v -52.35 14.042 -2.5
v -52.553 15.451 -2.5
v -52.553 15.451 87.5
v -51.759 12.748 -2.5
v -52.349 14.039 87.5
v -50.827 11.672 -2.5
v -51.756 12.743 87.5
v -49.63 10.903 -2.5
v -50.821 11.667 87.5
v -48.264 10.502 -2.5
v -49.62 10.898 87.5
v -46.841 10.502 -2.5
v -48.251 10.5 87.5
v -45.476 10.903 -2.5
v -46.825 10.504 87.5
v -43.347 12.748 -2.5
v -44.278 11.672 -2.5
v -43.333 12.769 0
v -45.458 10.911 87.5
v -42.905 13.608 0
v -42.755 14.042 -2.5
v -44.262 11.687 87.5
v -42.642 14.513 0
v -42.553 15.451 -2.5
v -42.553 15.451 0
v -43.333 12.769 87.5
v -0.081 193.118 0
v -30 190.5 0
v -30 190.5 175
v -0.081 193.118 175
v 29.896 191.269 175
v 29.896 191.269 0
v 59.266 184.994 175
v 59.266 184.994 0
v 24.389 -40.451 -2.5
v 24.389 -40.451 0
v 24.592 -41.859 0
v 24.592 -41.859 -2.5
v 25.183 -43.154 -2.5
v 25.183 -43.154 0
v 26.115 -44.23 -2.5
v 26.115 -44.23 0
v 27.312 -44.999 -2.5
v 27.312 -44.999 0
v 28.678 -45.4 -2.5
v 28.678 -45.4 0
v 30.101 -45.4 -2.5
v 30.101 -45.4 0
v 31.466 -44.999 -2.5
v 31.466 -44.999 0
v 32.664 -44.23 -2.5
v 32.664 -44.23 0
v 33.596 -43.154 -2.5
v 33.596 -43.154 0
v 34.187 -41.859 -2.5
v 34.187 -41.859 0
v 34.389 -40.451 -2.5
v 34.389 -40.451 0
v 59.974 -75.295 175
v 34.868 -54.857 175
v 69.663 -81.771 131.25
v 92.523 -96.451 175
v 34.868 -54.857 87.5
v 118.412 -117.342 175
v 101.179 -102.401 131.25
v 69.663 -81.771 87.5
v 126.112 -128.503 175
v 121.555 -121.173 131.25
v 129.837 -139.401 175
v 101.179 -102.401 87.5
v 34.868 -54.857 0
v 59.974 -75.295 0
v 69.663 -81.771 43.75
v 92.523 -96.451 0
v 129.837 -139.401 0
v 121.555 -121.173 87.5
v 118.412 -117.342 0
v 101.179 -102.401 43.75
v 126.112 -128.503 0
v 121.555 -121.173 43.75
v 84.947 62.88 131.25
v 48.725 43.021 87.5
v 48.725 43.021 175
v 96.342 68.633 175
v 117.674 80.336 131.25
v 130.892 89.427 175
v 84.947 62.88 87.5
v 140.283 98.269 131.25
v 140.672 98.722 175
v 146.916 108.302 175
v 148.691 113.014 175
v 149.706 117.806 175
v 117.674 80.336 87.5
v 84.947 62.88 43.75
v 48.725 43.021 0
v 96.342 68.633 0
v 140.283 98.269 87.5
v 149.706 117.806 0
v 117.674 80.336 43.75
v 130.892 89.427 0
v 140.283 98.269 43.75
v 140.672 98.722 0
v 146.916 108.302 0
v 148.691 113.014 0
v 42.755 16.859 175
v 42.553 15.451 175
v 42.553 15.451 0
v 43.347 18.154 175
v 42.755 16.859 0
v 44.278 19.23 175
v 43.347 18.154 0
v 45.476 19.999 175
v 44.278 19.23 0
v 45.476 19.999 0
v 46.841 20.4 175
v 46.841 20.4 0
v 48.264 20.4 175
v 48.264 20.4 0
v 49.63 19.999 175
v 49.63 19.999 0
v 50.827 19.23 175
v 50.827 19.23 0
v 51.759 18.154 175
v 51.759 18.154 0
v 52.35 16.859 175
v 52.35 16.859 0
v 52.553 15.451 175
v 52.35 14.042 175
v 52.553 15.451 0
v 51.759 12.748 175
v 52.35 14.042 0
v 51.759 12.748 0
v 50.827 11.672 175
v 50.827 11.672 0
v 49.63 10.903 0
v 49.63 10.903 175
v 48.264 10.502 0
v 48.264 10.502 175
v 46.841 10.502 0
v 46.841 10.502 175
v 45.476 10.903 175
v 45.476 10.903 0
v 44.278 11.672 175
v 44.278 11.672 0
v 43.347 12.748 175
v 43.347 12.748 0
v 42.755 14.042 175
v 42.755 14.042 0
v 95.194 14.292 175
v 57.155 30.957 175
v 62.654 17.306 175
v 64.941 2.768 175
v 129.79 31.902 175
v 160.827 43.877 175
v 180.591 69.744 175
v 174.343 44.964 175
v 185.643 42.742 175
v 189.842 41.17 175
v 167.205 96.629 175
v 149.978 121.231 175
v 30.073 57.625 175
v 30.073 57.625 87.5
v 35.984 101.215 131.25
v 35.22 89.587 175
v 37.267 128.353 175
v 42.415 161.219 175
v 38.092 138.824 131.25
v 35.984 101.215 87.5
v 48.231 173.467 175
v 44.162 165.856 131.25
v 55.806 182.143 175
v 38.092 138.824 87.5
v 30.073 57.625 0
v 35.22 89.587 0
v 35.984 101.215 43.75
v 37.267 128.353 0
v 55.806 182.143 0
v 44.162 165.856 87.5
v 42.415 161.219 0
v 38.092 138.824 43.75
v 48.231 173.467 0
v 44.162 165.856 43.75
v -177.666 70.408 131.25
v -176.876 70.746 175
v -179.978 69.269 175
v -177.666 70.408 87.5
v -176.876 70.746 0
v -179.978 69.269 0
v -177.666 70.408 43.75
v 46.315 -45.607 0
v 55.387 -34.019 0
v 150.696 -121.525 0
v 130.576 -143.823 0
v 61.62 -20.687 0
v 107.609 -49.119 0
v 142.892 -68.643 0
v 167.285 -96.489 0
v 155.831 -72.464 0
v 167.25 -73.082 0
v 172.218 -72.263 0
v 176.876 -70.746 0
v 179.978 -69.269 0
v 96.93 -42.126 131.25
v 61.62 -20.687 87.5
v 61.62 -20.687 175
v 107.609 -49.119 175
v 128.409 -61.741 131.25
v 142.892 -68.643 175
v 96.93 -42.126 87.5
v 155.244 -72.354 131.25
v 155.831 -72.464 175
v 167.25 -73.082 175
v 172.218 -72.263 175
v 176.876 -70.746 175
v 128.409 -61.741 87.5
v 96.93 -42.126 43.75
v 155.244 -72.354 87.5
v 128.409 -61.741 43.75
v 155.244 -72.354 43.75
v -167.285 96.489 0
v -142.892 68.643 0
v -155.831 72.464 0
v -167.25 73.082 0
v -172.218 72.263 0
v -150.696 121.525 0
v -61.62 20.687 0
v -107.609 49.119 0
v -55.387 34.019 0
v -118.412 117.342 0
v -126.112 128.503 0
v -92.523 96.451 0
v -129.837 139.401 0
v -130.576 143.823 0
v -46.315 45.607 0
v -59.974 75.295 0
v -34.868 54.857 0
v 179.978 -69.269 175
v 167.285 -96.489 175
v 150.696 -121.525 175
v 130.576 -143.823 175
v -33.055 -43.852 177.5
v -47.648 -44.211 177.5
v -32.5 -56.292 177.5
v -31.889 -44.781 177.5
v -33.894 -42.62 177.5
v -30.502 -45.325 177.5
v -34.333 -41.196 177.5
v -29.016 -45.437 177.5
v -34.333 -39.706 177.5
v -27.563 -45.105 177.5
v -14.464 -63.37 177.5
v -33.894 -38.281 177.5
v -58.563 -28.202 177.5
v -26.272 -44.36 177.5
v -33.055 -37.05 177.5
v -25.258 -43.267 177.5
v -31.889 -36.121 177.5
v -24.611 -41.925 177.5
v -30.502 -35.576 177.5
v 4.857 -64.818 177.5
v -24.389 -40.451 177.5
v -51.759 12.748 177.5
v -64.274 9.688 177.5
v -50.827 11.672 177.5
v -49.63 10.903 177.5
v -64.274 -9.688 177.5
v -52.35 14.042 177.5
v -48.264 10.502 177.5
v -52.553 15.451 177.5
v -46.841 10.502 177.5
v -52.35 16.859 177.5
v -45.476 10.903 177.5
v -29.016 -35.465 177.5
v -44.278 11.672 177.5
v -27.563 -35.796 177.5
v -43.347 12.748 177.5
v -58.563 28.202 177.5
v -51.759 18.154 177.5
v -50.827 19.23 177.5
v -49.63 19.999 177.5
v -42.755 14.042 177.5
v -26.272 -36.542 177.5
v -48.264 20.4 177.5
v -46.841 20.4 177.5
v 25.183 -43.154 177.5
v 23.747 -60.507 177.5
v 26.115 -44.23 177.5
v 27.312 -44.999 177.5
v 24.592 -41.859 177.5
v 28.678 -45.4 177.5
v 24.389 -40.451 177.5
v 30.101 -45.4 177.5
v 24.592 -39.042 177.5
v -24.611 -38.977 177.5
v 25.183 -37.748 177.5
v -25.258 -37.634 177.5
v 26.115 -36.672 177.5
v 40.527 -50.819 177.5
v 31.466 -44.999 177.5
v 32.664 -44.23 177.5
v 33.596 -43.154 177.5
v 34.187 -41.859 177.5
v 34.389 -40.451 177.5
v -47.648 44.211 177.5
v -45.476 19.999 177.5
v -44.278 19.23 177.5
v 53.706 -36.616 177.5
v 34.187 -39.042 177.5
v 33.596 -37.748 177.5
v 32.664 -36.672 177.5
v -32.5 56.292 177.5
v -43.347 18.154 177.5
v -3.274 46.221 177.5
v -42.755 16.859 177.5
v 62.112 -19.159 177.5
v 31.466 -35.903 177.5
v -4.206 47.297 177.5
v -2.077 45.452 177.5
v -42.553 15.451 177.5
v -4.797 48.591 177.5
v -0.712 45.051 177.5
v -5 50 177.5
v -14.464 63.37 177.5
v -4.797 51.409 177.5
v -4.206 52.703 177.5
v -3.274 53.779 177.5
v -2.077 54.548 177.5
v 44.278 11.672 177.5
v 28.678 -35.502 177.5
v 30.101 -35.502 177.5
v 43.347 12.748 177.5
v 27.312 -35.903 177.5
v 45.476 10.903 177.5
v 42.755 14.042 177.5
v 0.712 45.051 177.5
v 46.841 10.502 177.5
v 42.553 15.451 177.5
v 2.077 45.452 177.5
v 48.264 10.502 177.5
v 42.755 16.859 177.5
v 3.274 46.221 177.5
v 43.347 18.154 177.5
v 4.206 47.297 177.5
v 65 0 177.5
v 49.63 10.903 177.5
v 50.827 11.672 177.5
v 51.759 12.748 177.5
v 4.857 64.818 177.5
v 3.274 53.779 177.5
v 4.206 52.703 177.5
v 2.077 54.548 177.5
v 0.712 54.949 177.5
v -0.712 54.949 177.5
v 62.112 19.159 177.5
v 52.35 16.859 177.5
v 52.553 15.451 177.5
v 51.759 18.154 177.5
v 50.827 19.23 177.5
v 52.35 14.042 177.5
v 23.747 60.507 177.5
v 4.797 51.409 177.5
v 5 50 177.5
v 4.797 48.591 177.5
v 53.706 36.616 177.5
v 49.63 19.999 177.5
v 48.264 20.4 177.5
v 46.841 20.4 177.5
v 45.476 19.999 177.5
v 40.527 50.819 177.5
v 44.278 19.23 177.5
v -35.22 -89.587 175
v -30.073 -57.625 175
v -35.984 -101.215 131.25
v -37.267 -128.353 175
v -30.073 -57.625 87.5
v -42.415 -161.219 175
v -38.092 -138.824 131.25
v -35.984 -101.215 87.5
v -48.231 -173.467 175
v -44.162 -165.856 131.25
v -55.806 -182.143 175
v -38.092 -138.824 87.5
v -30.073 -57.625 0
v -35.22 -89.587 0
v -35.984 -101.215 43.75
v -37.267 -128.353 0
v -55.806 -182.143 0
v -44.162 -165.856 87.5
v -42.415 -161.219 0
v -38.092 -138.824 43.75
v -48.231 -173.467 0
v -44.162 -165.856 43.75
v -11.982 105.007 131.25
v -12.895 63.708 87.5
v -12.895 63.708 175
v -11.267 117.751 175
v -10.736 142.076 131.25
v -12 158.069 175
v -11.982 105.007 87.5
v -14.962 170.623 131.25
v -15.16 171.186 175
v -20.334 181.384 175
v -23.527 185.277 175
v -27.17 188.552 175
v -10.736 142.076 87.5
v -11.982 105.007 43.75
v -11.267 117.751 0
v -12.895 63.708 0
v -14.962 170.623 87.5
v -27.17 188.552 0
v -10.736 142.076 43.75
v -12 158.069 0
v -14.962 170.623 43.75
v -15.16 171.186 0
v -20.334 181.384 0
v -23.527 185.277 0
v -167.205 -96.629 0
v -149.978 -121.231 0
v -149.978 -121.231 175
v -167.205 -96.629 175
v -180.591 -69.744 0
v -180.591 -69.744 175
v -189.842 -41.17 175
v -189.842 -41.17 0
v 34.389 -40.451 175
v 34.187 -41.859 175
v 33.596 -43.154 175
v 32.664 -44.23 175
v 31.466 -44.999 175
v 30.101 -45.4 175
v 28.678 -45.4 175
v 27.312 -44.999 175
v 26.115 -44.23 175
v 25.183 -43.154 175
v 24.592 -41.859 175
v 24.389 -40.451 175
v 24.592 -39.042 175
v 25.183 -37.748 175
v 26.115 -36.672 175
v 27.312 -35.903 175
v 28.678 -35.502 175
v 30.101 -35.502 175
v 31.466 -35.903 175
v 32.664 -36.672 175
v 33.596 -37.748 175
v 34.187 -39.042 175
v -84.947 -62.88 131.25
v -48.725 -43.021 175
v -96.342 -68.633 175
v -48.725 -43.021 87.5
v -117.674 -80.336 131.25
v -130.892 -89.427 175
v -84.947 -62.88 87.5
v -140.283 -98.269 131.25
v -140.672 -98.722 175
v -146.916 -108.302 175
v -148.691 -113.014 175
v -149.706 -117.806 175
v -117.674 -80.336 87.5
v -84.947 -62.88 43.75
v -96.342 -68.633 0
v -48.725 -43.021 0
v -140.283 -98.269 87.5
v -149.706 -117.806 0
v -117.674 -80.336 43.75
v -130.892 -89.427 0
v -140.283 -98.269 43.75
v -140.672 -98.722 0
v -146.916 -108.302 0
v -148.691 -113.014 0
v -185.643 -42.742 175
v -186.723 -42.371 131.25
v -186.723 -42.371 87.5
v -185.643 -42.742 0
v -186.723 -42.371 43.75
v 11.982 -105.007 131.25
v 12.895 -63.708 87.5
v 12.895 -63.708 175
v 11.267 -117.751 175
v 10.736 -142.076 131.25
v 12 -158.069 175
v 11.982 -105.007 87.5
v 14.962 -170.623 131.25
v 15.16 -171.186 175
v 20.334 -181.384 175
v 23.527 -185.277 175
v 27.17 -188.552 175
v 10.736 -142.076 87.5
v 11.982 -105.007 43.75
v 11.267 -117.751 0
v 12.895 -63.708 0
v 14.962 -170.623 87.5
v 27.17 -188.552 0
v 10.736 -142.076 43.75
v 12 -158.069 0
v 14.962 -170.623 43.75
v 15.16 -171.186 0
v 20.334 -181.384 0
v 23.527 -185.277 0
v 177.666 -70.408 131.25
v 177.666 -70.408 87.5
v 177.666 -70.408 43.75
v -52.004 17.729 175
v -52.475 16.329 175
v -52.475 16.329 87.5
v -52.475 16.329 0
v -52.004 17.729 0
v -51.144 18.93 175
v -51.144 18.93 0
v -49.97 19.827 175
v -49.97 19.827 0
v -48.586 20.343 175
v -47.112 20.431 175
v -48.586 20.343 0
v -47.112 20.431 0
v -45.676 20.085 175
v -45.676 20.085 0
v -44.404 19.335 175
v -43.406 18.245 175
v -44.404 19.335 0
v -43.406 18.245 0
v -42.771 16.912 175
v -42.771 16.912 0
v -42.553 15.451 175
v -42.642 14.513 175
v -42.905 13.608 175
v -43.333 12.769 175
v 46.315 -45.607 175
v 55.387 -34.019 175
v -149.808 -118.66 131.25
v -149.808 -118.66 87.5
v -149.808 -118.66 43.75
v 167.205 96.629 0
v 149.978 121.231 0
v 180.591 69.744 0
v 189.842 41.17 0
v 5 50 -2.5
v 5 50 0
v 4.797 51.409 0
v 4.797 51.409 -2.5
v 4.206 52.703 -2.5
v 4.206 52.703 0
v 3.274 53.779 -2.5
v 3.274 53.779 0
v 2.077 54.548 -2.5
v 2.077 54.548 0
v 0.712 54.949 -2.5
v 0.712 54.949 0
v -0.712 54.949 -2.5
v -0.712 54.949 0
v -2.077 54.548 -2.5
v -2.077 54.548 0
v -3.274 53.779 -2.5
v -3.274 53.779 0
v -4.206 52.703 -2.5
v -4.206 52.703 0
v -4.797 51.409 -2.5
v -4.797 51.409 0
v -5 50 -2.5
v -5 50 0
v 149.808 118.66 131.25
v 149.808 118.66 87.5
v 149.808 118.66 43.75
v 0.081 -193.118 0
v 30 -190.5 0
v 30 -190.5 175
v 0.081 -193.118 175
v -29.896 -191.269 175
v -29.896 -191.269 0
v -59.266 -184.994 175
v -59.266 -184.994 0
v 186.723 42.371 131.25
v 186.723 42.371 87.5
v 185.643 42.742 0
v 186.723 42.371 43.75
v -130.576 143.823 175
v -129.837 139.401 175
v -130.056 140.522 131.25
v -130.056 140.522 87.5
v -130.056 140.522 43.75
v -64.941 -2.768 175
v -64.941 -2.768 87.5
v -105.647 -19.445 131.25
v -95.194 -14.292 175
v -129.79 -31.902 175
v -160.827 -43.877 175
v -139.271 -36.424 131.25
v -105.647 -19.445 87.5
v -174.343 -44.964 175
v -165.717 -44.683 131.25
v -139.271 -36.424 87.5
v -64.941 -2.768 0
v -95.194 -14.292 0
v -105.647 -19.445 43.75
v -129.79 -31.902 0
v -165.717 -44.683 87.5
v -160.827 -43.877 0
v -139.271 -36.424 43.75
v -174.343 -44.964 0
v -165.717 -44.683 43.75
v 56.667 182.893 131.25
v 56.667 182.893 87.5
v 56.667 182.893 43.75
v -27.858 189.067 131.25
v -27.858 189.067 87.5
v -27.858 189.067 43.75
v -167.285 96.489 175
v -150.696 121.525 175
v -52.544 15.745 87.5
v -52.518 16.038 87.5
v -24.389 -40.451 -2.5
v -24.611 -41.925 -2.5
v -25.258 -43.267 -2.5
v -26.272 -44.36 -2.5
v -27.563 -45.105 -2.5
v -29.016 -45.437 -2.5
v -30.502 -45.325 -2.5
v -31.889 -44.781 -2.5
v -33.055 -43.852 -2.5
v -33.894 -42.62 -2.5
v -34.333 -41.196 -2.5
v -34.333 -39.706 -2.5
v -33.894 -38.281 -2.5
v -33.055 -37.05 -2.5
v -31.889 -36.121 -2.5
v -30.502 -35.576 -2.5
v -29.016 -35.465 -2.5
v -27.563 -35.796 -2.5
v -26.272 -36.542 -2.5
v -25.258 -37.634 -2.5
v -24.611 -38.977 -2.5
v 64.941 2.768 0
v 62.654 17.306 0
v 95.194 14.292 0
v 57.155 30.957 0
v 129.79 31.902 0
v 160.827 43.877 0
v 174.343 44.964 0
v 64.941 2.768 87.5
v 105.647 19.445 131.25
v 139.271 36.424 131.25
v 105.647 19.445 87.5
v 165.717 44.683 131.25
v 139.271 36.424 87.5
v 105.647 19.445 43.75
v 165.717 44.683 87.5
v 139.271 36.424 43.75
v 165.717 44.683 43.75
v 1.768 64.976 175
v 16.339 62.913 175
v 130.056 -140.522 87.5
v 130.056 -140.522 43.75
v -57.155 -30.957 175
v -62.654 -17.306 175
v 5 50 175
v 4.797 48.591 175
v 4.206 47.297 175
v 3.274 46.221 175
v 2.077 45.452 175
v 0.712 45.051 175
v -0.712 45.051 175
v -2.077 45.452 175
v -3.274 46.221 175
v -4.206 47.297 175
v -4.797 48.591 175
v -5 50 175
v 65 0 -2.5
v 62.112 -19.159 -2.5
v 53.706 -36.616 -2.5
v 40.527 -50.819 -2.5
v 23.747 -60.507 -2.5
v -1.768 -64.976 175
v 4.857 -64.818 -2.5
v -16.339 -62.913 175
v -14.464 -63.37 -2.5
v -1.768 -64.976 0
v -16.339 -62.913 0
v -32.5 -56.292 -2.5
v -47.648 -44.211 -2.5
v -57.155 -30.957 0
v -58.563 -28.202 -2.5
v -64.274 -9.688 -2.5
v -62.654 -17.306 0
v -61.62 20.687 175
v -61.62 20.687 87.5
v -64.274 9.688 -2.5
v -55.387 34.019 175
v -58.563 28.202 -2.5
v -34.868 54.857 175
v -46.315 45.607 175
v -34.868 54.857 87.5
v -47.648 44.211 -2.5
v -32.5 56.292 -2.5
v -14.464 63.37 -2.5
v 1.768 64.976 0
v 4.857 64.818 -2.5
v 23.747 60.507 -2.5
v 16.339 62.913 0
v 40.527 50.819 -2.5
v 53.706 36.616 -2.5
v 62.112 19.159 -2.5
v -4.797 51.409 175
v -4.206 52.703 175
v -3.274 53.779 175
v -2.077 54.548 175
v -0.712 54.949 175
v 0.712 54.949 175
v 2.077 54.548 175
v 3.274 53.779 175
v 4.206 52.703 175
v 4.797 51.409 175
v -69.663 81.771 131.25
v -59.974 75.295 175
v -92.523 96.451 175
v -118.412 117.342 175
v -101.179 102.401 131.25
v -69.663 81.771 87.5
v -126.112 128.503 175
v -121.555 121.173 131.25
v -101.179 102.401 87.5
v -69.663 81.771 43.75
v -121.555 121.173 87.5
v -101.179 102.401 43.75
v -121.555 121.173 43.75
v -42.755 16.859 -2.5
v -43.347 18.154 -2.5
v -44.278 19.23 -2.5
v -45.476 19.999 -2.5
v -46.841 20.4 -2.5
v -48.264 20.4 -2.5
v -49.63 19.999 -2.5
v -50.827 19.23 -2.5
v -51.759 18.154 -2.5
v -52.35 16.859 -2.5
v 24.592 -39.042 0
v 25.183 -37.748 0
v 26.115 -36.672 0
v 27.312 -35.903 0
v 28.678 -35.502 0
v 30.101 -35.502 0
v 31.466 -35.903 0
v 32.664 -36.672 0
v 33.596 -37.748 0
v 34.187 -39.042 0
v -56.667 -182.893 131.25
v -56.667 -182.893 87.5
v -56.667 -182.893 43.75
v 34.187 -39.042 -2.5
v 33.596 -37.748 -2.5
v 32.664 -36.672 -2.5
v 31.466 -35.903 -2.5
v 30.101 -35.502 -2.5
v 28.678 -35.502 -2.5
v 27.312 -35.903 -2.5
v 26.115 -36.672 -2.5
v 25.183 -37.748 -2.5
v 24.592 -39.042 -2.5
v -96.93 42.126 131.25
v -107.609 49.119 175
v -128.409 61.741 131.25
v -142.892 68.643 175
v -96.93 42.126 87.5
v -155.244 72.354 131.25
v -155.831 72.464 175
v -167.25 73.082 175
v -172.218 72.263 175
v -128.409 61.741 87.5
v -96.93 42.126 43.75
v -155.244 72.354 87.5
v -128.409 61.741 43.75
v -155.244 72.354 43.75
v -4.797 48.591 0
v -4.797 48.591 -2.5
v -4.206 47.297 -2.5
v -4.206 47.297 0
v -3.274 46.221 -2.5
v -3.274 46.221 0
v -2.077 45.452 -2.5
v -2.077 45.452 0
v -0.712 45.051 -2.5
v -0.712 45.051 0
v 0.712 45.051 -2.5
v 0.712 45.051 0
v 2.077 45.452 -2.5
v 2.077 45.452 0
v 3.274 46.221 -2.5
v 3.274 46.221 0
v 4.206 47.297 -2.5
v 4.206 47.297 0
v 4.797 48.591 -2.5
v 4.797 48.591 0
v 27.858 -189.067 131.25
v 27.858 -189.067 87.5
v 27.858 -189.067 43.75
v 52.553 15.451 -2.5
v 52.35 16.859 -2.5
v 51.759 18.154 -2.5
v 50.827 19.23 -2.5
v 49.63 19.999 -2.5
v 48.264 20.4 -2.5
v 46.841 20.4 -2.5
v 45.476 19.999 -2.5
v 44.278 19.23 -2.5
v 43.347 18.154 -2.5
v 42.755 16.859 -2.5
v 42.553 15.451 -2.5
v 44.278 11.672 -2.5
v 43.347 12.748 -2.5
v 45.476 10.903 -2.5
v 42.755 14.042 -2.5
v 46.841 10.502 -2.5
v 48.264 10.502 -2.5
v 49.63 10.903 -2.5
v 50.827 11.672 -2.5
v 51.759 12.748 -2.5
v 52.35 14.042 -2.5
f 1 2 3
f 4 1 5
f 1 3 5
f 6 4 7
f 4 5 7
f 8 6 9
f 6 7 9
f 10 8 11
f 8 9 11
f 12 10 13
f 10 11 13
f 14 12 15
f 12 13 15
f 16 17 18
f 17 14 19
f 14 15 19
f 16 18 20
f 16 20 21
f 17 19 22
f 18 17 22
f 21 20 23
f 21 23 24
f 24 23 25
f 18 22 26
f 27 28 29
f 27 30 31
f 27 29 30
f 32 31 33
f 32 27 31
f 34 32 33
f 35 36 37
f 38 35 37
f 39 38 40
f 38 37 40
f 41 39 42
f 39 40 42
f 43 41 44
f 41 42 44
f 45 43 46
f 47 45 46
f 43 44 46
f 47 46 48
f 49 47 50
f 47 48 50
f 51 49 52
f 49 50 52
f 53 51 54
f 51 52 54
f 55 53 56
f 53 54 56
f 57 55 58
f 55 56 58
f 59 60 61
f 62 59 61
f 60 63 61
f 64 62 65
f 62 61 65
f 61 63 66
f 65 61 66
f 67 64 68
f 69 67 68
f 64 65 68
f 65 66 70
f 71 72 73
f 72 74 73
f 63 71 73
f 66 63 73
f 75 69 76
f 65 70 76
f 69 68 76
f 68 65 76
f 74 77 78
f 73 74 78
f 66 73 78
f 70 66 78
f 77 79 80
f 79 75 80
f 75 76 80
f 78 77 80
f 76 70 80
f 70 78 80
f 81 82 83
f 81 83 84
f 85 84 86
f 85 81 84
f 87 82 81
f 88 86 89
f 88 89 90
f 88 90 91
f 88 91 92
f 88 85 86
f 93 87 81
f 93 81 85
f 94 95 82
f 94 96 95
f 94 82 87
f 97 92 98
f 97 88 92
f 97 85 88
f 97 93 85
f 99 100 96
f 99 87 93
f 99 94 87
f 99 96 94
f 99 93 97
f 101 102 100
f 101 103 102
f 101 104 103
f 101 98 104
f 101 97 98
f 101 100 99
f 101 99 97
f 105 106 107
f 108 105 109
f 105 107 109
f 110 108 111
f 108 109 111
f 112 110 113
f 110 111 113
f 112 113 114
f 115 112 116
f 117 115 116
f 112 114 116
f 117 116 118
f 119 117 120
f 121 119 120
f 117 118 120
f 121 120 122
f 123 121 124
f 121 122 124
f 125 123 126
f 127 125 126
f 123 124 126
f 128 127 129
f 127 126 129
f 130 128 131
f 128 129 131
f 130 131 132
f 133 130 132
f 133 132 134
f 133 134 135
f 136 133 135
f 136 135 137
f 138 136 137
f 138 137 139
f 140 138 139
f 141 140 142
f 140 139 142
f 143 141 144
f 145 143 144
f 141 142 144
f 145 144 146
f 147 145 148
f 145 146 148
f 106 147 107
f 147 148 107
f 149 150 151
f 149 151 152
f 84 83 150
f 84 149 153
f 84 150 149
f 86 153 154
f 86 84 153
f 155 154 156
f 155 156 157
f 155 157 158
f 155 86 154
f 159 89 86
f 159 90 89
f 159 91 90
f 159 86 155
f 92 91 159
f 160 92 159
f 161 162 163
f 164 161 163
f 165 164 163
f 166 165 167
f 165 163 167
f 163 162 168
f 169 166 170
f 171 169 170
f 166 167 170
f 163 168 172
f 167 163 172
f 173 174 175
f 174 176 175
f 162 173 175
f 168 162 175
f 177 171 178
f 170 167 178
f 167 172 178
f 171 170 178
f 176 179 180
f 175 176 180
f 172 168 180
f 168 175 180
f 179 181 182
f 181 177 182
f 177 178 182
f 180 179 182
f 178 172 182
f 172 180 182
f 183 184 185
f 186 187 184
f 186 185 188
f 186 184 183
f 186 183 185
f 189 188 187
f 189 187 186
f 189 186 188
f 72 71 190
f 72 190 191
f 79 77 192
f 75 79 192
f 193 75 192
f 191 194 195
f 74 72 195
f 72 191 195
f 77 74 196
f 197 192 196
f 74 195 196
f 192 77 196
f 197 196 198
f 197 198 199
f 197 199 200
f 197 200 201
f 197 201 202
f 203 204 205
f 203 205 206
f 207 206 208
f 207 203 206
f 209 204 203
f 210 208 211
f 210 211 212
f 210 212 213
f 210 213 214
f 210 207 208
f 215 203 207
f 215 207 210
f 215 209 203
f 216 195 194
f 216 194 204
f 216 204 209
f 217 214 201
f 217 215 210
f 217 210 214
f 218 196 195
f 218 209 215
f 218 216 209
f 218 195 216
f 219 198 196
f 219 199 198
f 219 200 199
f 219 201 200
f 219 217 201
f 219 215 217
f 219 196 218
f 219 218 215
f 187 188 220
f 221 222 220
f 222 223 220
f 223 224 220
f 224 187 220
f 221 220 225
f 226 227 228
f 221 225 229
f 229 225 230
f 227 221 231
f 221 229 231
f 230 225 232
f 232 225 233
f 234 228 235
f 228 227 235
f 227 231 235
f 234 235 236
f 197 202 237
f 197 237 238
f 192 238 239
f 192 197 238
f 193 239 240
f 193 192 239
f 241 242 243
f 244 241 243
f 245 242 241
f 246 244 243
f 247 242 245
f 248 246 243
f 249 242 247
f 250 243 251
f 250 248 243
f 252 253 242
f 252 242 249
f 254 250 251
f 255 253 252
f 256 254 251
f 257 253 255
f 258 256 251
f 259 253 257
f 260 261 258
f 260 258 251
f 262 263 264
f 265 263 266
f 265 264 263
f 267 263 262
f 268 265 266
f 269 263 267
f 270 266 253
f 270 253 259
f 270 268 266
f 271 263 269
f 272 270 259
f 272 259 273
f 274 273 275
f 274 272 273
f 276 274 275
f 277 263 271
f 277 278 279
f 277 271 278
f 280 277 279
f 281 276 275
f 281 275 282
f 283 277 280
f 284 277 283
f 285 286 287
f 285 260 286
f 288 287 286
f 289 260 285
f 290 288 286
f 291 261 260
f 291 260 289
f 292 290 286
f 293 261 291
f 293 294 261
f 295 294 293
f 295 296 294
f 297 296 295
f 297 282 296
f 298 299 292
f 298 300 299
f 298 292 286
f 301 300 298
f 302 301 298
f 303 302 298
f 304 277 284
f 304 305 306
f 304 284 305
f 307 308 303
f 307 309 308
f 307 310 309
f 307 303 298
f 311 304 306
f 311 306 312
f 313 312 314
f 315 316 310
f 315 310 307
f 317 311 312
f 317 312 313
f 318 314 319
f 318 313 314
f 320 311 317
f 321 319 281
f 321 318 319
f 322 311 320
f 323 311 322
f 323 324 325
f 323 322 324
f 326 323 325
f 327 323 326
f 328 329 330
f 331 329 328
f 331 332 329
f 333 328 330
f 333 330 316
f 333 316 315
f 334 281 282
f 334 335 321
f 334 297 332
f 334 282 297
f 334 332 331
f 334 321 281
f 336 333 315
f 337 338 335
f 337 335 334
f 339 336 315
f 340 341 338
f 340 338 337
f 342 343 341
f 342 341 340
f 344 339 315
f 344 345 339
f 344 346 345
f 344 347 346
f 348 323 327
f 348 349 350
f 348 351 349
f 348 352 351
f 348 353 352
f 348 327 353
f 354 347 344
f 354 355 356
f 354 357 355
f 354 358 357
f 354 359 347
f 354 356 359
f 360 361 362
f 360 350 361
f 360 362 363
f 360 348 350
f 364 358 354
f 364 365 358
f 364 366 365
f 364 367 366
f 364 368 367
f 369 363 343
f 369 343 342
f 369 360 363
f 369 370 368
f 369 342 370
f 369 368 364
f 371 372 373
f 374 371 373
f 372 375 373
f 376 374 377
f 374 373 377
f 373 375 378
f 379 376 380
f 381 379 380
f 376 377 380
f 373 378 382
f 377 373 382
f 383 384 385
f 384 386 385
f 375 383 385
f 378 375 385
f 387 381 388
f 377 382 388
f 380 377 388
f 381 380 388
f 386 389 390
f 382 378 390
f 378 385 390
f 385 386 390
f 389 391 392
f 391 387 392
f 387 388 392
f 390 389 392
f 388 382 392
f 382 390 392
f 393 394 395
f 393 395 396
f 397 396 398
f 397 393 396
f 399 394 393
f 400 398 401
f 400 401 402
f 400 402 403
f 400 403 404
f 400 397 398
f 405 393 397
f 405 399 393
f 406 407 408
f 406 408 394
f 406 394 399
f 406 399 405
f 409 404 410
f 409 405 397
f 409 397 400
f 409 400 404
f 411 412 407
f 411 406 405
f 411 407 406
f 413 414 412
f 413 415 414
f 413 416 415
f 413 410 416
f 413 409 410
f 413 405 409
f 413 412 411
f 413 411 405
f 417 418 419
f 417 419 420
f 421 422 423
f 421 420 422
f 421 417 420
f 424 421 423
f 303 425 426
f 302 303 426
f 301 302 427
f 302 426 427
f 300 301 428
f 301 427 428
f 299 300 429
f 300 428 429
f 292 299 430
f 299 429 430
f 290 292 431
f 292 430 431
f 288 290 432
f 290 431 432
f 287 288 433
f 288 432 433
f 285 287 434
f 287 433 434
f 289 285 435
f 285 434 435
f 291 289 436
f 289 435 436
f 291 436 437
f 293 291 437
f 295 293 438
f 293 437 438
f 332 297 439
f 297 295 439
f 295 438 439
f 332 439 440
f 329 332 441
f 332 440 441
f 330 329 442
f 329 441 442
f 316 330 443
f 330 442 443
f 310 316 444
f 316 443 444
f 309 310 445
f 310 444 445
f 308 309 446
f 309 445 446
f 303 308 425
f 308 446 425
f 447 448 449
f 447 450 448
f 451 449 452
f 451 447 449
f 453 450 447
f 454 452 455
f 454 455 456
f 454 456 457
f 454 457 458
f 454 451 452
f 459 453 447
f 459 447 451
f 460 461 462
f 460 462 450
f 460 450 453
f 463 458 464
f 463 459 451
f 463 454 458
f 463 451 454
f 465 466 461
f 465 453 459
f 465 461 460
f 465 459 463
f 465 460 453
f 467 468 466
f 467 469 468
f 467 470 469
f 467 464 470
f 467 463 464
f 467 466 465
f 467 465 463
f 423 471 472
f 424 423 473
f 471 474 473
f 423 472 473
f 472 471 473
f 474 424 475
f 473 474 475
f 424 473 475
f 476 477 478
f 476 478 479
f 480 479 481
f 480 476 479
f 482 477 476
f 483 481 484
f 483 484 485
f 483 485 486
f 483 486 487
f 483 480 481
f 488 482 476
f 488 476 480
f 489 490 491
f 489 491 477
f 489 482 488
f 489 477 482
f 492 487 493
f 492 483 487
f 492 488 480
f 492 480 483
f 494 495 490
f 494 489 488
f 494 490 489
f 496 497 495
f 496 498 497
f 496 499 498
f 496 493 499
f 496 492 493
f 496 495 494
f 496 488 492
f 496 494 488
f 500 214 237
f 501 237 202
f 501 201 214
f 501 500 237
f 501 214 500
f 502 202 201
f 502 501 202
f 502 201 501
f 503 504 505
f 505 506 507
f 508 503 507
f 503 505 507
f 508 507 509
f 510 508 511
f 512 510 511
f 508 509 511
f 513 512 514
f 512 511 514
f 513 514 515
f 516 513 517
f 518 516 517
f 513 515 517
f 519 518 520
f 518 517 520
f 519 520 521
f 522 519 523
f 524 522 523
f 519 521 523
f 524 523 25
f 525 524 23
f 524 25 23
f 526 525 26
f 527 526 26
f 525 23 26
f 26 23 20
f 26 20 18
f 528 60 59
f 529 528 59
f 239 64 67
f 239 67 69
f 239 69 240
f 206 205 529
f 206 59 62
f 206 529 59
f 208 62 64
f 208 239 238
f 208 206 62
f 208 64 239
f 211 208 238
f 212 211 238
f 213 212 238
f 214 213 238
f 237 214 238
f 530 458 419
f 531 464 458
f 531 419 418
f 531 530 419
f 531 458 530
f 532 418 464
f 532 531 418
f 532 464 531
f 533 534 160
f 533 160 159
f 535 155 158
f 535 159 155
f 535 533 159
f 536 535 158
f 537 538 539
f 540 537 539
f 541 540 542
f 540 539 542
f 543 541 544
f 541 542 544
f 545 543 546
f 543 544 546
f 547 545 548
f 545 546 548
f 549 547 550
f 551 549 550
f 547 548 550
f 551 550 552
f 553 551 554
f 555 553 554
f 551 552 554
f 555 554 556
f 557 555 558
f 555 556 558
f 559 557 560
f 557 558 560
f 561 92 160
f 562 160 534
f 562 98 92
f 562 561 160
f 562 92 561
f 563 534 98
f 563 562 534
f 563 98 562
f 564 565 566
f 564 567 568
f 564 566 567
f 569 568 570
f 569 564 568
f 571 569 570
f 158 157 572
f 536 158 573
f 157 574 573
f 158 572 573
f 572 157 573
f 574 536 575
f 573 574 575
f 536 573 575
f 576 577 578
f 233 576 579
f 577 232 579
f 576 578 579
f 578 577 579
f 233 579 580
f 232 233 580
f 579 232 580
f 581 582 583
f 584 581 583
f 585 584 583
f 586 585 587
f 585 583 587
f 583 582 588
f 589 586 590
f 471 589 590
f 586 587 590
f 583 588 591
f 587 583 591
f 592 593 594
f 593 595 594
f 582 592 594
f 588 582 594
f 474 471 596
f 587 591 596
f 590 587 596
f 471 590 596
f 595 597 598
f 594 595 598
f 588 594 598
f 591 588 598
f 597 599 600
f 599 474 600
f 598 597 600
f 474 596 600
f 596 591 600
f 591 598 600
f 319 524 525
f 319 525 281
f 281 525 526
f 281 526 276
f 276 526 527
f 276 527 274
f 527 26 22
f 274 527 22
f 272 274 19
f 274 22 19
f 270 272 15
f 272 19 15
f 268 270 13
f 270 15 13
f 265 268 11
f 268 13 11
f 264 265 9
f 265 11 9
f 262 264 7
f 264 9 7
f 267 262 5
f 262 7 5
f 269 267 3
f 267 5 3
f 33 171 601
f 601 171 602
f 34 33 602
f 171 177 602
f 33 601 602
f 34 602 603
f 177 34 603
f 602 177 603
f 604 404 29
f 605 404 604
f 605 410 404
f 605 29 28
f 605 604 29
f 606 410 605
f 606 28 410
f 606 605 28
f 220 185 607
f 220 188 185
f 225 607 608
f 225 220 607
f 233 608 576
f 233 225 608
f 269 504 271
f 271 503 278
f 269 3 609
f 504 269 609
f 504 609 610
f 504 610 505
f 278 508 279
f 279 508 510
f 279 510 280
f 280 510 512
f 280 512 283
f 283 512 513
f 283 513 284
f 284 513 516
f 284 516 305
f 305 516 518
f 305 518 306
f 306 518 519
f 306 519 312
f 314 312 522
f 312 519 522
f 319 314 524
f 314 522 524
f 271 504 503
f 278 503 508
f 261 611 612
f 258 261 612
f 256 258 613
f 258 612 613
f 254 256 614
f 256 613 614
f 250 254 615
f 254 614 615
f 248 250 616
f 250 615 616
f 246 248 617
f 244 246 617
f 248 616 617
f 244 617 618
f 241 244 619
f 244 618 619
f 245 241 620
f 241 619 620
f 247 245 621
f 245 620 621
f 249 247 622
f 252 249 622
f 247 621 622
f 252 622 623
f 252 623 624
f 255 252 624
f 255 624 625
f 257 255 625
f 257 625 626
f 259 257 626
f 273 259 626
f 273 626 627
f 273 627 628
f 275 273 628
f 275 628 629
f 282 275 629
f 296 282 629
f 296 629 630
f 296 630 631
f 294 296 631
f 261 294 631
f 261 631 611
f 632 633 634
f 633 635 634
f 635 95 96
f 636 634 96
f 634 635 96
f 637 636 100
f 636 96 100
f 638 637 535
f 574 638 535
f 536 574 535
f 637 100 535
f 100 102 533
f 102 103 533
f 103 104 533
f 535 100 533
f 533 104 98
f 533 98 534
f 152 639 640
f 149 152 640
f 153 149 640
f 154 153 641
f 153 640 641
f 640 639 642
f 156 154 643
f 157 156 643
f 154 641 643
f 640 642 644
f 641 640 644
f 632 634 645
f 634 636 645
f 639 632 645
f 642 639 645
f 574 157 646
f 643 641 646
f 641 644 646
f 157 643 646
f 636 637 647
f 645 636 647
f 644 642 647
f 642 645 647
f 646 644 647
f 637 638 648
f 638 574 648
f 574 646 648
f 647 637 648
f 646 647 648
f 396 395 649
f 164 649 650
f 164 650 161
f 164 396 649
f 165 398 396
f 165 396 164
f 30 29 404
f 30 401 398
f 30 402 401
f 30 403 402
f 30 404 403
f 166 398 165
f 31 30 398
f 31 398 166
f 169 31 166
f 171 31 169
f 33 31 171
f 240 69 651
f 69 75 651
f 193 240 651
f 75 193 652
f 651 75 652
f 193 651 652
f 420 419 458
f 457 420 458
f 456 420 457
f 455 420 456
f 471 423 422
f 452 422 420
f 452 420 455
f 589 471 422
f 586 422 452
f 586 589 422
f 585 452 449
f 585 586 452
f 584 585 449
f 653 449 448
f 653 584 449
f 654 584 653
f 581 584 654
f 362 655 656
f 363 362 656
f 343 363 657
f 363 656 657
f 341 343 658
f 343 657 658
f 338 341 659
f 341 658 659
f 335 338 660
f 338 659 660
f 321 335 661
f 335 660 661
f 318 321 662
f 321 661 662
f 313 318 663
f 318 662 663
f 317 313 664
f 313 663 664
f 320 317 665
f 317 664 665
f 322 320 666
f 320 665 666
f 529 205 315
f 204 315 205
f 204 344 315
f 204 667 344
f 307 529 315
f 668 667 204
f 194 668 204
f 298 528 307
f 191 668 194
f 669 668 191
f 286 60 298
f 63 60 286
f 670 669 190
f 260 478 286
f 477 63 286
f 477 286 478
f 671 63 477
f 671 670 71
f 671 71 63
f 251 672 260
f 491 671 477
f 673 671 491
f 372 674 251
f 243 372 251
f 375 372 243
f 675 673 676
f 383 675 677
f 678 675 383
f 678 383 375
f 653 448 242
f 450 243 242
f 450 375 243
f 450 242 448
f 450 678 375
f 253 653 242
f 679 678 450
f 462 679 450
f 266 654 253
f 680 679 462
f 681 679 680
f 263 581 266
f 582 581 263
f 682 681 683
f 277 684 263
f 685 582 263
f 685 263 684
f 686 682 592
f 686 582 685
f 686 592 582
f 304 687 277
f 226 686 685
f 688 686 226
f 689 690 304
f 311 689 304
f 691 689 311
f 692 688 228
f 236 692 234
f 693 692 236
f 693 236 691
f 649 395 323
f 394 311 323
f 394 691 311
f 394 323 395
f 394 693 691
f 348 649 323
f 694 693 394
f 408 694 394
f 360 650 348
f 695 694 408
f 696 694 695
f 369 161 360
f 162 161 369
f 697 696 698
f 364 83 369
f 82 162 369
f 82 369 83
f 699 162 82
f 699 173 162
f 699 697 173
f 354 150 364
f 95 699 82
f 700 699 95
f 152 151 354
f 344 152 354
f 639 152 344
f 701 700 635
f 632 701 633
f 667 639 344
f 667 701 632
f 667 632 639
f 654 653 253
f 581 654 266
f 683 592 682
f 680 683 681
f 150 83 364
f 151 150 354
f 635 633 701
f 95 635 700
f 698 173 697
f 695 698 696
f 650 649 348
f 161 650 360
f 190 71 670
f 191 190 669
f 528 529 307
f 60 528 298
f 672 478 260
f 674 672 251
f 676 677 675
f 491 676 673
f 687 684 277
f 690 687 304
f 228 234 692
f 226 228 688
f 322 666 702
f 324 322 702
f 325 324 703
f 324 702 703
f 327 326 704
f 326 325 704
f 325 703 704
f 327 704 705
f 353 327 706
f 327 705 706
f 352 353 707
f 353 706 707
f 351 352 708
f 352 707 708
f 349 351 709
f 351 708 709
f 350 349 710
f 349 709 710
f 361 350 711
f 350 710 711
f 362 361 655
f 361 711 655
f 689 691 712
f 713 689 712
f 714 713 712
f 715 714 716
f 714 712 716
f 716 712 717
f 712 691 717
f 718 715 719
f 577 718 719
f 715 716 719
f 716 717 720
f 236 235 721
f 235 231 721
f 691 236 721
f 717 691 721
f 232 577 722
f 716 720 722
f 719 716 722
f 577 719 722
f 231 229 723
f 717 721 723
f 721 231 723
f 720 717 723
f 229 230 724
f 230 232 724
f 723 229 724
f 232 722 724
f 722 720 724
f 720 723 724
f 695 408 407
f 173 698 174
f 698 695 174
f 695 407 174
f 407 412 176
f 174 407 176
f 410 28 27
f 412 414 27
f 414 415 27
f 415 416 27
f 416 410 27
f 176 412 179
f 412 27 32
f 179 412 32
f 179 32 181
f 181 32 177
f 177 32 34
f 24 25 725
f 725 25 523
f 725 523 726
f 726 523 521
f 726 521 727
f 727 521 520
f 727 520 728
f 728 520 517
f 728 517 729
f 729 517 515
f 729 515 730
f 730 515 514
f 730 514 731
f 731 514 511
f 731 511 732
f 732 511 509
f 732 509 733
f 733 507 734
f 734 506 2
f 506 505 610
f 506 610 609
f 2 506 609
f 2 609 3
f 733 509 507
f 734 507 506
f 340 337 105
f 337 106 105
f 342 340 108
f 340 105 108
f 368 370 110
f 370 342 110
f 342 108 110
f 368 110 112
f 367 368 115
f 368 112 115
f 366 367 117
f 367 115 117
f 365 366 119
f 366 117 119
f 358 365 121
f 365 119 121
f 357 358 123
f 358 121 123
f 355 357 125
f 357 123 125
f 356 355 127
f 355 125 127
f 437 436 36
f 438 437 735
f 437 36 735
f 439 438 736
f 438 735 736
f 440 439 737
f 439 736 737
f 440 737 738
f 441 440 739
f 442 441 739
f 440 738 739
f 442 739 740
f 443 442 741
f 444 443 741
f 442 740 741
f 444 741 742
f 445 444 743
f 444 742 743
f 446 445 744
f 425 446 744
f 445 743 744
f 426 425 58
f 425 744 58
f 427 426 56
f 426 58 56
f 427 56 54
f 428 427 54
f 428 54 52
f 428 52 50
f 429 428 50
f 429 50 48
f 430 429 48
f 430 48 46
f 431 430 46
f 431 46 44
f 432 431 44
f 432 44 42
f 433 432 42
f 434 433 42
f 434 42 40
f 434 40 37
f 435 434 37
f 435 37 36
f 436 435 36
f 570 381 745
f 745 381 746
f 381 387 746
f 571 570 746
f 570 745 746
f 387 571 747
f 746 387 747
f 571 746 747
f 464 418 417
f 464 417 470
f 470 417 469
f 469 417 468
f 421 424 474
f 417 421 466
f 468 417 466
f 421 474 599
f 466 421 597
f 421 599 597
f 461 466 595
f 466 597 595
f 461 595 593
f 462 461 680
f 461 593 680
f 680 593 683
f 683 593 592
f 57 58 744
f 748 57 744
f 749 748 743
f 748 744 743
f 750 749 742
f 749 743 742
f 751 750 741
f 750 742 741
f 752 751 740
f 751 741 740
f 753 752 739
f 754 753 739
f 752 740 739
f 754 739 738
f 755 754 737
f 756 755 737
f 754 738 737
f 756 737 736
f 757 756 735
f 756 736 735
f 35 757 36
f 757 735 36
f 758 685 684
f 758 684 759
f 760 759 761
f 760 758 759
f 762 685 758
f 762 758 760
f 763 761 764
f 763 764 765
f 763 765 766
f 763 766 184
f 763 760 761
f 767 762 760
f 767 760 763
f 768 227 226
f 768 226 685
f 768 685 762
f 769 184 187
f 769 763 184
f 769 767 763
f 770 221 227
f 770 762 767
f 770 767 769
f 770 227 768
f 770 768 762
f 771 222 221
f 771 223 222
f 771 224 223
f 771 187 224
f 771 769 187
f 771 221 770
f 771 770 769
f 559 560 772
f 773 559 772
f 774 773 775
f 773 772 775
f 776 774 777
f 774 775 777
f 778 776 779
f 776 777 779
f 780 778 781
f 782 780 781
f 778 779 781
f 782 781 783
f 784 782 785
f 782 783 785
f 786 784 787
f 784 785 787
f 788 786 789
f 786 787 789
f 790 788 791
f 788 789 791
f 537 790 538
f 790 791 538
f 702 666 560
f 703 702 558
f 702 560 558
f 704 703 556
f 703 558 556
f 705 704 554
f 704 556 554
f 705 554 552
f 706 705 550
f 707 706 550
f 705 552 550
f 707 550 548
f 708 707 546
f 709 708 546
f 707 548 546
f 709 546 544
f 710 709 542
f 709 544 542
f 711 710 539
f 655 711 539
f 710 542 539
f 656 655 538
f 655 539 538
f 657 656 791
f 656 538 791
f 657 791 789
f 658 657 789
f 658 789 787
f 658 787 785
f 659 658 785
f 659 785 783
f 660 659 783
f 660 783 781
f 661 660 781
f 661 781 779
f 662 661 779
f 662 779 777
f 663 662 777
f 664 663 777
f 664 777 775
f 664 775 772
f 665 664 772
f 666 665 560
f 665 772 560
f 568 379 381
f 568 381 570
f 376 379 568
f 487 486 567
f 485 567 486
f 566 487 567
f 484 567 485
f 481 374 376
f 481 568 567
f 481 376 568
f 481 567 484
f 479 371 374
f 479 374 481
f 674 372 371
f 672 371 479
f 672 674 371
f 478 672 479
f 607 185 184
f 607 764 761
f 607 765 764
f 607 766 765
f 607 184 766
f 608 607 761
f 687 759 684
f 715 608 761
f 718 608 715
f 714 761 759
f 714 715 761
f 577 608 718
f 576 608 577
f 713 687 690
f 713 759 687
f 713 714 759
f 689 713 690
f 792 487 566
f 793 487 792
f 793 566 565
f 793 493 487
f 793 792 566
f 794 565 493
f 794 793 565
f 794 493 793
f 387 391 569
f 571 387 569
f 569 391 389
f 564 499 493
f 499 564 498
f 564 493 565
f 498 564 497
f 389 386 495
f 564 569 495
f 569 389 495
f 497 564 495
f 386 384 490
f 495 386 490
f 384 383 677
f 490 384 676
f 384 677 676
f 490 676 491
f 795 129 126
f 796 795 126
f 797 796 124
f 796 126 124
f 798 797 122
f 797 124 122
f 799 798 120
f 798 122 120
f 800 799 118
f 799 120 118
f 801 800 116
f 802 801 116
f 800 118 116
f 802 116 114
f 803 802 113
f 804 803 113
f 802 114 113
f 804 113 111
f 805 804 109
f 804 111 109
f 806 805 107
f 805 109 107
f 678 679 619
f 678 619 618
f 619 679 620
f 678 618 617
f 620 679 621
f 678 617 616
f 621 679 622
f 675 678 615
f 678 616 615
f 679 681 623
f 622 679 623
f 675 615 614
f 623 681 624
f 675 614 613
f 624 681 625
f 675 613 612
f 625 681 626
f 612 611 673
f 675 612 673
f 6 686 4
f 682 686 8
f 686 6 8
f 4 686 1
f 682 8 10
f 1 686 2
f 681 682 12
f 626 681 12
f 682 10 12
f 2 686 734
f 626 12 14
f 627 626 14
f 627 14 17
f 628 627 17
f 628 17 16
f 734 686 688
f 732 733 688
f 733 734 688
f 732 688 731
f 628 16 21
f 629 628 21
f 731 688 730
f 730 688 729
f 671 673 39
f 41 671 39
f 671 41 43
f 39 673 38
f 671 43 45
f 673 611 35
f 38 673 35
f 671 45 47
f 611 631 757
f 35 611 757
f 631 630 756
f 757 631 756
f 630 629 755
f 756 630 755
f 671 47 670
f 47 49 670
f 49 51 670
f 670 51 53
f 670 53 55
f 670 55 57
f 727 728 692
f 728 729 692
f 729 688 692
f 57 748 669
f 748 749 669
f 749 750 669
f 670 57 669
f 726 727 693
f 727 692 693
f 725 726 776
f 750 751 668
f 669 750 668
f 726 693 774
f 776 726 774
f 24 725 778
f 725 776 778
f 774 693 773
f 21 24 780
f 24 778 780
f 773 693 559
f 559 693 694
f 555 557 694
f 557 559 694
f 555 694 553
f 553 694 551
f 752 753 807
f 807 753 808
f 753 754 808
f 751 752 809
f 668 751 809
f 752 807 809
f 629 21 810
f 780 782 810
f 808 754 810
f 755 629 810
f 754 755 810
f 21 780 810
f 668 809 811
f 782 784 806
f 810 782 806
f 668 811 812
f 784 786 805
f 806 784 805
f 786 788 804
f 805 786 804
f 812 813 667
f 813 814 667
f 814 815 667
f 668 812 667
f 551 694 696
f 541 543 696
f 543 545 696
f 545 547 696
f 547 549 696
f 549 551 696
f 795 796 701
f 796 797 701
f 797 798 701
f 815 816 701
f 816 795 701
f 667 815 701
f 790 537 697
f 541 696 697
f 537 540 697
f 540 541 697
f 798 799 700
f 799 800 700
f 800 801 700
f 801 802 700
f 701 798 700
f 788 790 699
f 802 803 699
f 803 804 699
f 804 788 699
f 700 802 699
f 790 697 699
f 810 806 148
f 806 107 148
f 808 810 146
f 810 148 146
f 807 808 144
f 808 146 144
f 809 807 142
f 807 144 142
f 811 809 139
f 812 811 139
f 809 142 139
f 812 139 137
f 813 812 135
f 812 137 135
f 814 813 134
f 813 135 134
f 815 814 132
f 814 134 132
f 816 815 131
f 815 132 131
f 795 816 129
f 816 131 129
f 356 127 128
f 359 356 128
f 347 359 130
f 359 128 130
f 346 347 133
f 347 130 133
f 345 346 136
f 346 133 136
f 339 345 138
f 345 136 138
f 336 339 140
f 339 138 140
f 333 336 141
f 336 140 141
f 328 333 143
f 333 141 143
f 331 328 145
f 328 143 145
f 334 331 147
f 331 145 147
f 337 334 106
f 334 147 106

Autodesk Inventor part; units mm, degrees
ref_plane "YZ Plane" through (0, 0, 0) normal (1, 0, 0) x (0, 1, 0)
ref_plane "XZ Plane" through (0, 0, 0) normal (0, 1, 0) x (-1, 0, 0)
sketch "Sketch2" plane through (0, 0, 0) normal (0, 0, 1) x (1, 0, 0)
  point P0 (0, 0)
ref_plane "Work Plane1" through (0, 0, 87.5) normal (0, 0, 1) x (1, 0, 0)
sketch "Sketch3" plane through (0, 0, 87.5) normal (0, 0, 1) x (1, 0, 0)
  circle A0 centre (0, 0) radius 65
  circle A1 centre (0, 50) radius 5
  circle A2 centre (-47.5528, 15.4508) radius 5
  circle A3 centre (-29.3893, -40.4508) radius 5
  circle A4 centre (29.3893, -40.4508) radius 5
  circle A5 centre (47.5528, 15.4508) radius 5
  dimension "d11" = 130
  dimension "d33" = 10
  dimension "d36" = 360
sketch "Sketch5" plane through (0, 0, 0) normal (0, 0, 1) x (1, 0, 0)
  circle A0 centre (0, 0) radius 30
  circle A1 centre (0, 0) radius 190.5
  line L0 (6.509, 17.129) -> (57.211, 63.0349) construction
  line L1 (57.211, 63.0349) -> (22.2678, 145.9394) construction
  line L2 (22.2678, 145.9394) -> (41.4523, 171.2904) construction
  line L3 (41.4523, 171.2904) -> (59.2665, 184.9937) construction
  spline S0 degree 4 poles (6.509, 17.129) (57.211, 63.0349) (22.2678, 145.9394) (41.4523, 171.2904) (59.2665, 184.9937) knots 1 1 1 1 1 2 2 2 2 2
  line L4 (0, 17.129) -> (-30, 60.9794) construction
  line L5 (-30, 60.9794) -> (0, 136.3472) construction
  line L6 (0, 136.3472) -> (-6.509, 176.0866) construction
  line L7 (-6.509, 176.0866) -> (-30, 190.5) construction
  spline S1 degree 4 poles (0, 17.129) (-30, 60.9794) (0, 136.3472) (-6.509, 176.0866) (-30, 190.5) knots 1 1 1 1 1 2 2 2 2 2
  line L8 (0, 17.129) -> (6.509, 17.129)
  arc A2 (59.2665, 184.9937) -> (-30, 190.5) centre (2.5103, -8.7844) ccw
  line L9 (-11.5797, 14.2015) -> (-25.9843, 81.0636) construction
  line L10 (-25.9843, 81.0636) -> (-115.2534, 92.2542) construction
  line L11 (-115.2534, 92.2542) -> (-127.6157, 121.5439) construction
  line L12 (-127.6157, 121.5439) -> (-130.576, 143.8231) construction
  spline S2 degree 4 poles (-11.5797, 14.2015) (-25.9843, 81.0636) (-115.2534, 92.2542) (-127.6157, 121.5439) (-130.576, 143.8231) knots 1 1 1 1 1 2 2 2 2 2
  line L13 (-14.8342, 8.5645) -> (-67.8097, 4.5089) construction
  line L14 (-67.8097, 4.5089) -> (-118.0801, 68.1736) construction
  line L15 (-118.0801, 68.1736) -> (-155.7499, 82.4063) construction
  line L16 (-155.7499, 82.4063) -> (-179.9778, 69.2692) construction
  spline S3 degree 4 poles (-14.8342, 8.5645) (-67.8097, 4.5089) (-118.0801, 68.1736) (-155.7499, 82.4063) (-179.9778, 69.2692) knots 1 1 1 1 1 2 2 2 2 2
  line L17 (-14.8342, 8.5645) -> (-11.5797, 14.2015)
  arc A3 (-130.576, 143.8231) -> (-179.9778, 69.2692) centre (8.8627, -2.2182) ccw
  line L18 (-18.0887, -2.9275) -> (-83.1953, 18.0287) construction
  line L19 (-83.1953, 18.0287) -> (-137.5211, -53.6853) construction
  line L20 (-137.5211, -53.6853) -> (-169.068, -49.7465) construction
  line L21 (-169.068, -49.7465) -> (-189.8425, -41.1705) construction
  spline S4 degree 4 poles (-18.0887, -2.9275) (-83.1953, 18.0287) (-137.5211, -53.6853) (-169.068, -49.7465) (-189.8425, -41.1705) knots 1 1 1 1 1 2 2 2 2 2
  line L22 (-14.8342, -8.5645) -> (-37.8097, -56.4705) construction
  line L23 (-37.8097, -56.4705) -> (-118.0801, -68.1736) construction
  line L24 (-118.0801, -68.1736) -> (-149.2409, -93.6803) construction
  line L25 (-149.2409, -93.6803) -> (-149.9778, -121.2308) construction
  spline S5 degree 4 poles (-14.8342, -8.5645) (-37.8097, -56.4705) (-118.0801, -68.1736) (-149.2409, -93.6803) (-149.9778, -121.2308) knots 1 1 1 1 1 2 2 2 2 2
  line L26 (-14.8342, -8.5645) -> (-18.0887, -2.9275)
  arc A4 (-189.8425, -41.1705) -> (-149.9778, -121.2308) centre (6.3524, 6.5662) ccw
  line L27 (-6.509, -17.129) -> (-57.211, -63.0349) construction
  line L28 (-57.211, -63.0349) -> (-22.2678, -145.9394) construction
  line L29 (-22.2678, -145.9394) -> (-41.4523, -171.2904) construction
  line L30 (-41.4523, -171.2904) -> (-59.2665, -184.9937) construction
  spline S6 degree 4 poles (-6.509, -17.129) (-57.211, -63.0349) (-22.2678, -145.9394) (-41.4523, -171.2904) (-59.2665, -184.9937) knots 1 1 1 1 1 2 2 2 2 2
  line L31 (0, -17.129) -> (30, -60.9794) construction
  line L32 (30, -60.9794) -> (0, -136.3472) construction
  line L33 (0, -136.3472) -> (6.509, -176.0866) construction
  line L34 (6.509, -176.0866) -> (30, -190.5) construction
  spline S7 degree 4 poles (0, -17.129) (30, -60.9794) (0, -136.3472) (6.509, -176.0866) (30, -190.5) knots 1 1 1 1 1 2 2 2 2 2
  line L35 (0, -17.129) -> (-6.509, -17.129)
  arc A5 (-59.2665, -184.9937) -> (30, -190.5) centre (-2.5103, 8.7844) ccw
  line L36 (11.5797, -14.2015) -> (25.9843, -81.0636) construction
  line L37 (25.9843, -81.0636) -> (115.2534, -92.2542) construction
  line L38 (115.2534, -92.2542) -> (127.6157, -121.5439) construction
  line L39 (127.6157, -121.5439) -> (130.576, -143.8231) construction
  spline S8 degree 4 poles (11.5797, -14.2015) (25.9843, -81.0636) (115.2534, -92.2542) (127.6157, -121.5439) (130.576, -143.8231) knots 1 1 1 1 1 2 2 2 2 2
  line L40 (14.8342, -8.5645) -> (67.8097, -4.5089) construction
  line L41 (67.8097, -4.5089) -> (118.0801, -68.1736) construction
  line L42 (118.0801, -68.1736) -> (155.7499, -82.4063) construction
  line L43 (155.7499, -82.4063) -> (179.9778, -69.2692) construction
  spline S9 degree 4 poles (14.8342, -8.5645) (67.8097, -4.5089) (118.0801, -68.1736) (155.7499, -82.4063) (179.9778, -69.2692) knots 1 1 1 1 1 2 2 2 2 2
  line L44 (14.8342, -8.5645) -> (11.5797, -14.2015)
  arc A6 (130.576, -143.8231) -> (179.9778, -69.2692) centre (-8.8627, 2.2182) ccw
  line L45 (18.0887, 2.9275) -> (83.1953, -18.0287) construction
  line L46 (83.1953, -18.0287) -> (137.5211, 53.6853) construction
  line L47 (137.5211, 53.6853) -> (169.068, 49.7465) construction
  line L48 (169.068, 49.7465) -> (189.8425, 41.1705) construction
  spline S10 degree 4 poles (18.0887, 2.9275) (83.1953, -18.0287) (137.5211, 53.6853) (169.068, 49.7465) (189.8425, 41.1705) knots 1 1 1 1 1 2 2 2 2 2
  line L49 (14.8342, 8.5645) -> (37.8097, 56.4705) construction
  line L50 (37.8097, 56.4705) -> (118.0801, 68.1736) construction
  line L51 (118.0801, 68.1736) -> (149.2409, 93.6803) construction
  line L52 (149.2409, 93.6803) -> (149.9778, 121.2308) construction
  spline S11 degree 4 poles (14.8342, 8.5645) (37.8097, 56.4705) (118.0801, 68.1736) (149.2409, 93.6803) (149.9778, 121.2308) knots 1 1 1 1 1 2 2 2 2 2
  line L53 (14.8342, 8.5645) -> (18.0887, 2.9275)
  arc A7 (189.8425, 41.1705) -> (149.9778, 121.2308) centre (-6.3524, -6.5662) ccw
  dimension "d24" = 60
  dimension "d25" = 381
  dimension "d28" = 360
extrude "Extrusion4" add sketch "Sketch5" along normal blind 175 contours S10 L53 S11 A0 | A0 S11 A1 S10 | S9 A1 S8 A0 | A0 S8 L44 S9 | A1 S11 A7 S10 | S9 A6 S8 A1 | S0 L8 S1 A0 | A0 S1 A1 S0 | S7 A1 S6 A0 | A0 S6 L35 S7 | A1 S1 A2 S0 | S7 A5 S6 A1 | S2 L17 S3 A0 | A0 S3 A1 S2 | S5 A1 S4 A0 | A0 S4 L26 S5 | A1 S3 A3 S2 | S5 A4 S4 A1
extrude "Extrusion5" add sketch "Sketch3" along normal mid plane 180
sketch "Sketch6" plane through (0, 0, -2.5) normal (0, 0, -1) x (-1, 0, 0)
  circle A0 centre (-47.5528, 15.4508) radius 5 projected
  circle A1 centre (-29.3893, -40.4508) radius 5 projected
  circle A2 centre (29.3893, -40.4508) radius 5 projected
  circle A3 centre (47.5528, 15.4508) radius 5 projected
  circle A4 centre (0, 50) radius 5 projected
  circle A5 centre (0, 0) radius 65 projected
  circle A6 centre (0, 50) radius 5
  circle A7 centre (-47.5528, 15.4508) radius 5
  circle A8 centre (-29.3893, -40.4508) radius 5
  circle A9 centre (29.3893, -40.4508) radius 5
  circle A10 centre (47.5528, 15.4508) radius 5
  dimension "d42" = 360
extrude "Extrusion6" cut sketch "Sketch6" against normal blind 1800 contours A0 | A1 | A2 | A3 | A4
properties part number "velg" material "Aluminum 6061"
